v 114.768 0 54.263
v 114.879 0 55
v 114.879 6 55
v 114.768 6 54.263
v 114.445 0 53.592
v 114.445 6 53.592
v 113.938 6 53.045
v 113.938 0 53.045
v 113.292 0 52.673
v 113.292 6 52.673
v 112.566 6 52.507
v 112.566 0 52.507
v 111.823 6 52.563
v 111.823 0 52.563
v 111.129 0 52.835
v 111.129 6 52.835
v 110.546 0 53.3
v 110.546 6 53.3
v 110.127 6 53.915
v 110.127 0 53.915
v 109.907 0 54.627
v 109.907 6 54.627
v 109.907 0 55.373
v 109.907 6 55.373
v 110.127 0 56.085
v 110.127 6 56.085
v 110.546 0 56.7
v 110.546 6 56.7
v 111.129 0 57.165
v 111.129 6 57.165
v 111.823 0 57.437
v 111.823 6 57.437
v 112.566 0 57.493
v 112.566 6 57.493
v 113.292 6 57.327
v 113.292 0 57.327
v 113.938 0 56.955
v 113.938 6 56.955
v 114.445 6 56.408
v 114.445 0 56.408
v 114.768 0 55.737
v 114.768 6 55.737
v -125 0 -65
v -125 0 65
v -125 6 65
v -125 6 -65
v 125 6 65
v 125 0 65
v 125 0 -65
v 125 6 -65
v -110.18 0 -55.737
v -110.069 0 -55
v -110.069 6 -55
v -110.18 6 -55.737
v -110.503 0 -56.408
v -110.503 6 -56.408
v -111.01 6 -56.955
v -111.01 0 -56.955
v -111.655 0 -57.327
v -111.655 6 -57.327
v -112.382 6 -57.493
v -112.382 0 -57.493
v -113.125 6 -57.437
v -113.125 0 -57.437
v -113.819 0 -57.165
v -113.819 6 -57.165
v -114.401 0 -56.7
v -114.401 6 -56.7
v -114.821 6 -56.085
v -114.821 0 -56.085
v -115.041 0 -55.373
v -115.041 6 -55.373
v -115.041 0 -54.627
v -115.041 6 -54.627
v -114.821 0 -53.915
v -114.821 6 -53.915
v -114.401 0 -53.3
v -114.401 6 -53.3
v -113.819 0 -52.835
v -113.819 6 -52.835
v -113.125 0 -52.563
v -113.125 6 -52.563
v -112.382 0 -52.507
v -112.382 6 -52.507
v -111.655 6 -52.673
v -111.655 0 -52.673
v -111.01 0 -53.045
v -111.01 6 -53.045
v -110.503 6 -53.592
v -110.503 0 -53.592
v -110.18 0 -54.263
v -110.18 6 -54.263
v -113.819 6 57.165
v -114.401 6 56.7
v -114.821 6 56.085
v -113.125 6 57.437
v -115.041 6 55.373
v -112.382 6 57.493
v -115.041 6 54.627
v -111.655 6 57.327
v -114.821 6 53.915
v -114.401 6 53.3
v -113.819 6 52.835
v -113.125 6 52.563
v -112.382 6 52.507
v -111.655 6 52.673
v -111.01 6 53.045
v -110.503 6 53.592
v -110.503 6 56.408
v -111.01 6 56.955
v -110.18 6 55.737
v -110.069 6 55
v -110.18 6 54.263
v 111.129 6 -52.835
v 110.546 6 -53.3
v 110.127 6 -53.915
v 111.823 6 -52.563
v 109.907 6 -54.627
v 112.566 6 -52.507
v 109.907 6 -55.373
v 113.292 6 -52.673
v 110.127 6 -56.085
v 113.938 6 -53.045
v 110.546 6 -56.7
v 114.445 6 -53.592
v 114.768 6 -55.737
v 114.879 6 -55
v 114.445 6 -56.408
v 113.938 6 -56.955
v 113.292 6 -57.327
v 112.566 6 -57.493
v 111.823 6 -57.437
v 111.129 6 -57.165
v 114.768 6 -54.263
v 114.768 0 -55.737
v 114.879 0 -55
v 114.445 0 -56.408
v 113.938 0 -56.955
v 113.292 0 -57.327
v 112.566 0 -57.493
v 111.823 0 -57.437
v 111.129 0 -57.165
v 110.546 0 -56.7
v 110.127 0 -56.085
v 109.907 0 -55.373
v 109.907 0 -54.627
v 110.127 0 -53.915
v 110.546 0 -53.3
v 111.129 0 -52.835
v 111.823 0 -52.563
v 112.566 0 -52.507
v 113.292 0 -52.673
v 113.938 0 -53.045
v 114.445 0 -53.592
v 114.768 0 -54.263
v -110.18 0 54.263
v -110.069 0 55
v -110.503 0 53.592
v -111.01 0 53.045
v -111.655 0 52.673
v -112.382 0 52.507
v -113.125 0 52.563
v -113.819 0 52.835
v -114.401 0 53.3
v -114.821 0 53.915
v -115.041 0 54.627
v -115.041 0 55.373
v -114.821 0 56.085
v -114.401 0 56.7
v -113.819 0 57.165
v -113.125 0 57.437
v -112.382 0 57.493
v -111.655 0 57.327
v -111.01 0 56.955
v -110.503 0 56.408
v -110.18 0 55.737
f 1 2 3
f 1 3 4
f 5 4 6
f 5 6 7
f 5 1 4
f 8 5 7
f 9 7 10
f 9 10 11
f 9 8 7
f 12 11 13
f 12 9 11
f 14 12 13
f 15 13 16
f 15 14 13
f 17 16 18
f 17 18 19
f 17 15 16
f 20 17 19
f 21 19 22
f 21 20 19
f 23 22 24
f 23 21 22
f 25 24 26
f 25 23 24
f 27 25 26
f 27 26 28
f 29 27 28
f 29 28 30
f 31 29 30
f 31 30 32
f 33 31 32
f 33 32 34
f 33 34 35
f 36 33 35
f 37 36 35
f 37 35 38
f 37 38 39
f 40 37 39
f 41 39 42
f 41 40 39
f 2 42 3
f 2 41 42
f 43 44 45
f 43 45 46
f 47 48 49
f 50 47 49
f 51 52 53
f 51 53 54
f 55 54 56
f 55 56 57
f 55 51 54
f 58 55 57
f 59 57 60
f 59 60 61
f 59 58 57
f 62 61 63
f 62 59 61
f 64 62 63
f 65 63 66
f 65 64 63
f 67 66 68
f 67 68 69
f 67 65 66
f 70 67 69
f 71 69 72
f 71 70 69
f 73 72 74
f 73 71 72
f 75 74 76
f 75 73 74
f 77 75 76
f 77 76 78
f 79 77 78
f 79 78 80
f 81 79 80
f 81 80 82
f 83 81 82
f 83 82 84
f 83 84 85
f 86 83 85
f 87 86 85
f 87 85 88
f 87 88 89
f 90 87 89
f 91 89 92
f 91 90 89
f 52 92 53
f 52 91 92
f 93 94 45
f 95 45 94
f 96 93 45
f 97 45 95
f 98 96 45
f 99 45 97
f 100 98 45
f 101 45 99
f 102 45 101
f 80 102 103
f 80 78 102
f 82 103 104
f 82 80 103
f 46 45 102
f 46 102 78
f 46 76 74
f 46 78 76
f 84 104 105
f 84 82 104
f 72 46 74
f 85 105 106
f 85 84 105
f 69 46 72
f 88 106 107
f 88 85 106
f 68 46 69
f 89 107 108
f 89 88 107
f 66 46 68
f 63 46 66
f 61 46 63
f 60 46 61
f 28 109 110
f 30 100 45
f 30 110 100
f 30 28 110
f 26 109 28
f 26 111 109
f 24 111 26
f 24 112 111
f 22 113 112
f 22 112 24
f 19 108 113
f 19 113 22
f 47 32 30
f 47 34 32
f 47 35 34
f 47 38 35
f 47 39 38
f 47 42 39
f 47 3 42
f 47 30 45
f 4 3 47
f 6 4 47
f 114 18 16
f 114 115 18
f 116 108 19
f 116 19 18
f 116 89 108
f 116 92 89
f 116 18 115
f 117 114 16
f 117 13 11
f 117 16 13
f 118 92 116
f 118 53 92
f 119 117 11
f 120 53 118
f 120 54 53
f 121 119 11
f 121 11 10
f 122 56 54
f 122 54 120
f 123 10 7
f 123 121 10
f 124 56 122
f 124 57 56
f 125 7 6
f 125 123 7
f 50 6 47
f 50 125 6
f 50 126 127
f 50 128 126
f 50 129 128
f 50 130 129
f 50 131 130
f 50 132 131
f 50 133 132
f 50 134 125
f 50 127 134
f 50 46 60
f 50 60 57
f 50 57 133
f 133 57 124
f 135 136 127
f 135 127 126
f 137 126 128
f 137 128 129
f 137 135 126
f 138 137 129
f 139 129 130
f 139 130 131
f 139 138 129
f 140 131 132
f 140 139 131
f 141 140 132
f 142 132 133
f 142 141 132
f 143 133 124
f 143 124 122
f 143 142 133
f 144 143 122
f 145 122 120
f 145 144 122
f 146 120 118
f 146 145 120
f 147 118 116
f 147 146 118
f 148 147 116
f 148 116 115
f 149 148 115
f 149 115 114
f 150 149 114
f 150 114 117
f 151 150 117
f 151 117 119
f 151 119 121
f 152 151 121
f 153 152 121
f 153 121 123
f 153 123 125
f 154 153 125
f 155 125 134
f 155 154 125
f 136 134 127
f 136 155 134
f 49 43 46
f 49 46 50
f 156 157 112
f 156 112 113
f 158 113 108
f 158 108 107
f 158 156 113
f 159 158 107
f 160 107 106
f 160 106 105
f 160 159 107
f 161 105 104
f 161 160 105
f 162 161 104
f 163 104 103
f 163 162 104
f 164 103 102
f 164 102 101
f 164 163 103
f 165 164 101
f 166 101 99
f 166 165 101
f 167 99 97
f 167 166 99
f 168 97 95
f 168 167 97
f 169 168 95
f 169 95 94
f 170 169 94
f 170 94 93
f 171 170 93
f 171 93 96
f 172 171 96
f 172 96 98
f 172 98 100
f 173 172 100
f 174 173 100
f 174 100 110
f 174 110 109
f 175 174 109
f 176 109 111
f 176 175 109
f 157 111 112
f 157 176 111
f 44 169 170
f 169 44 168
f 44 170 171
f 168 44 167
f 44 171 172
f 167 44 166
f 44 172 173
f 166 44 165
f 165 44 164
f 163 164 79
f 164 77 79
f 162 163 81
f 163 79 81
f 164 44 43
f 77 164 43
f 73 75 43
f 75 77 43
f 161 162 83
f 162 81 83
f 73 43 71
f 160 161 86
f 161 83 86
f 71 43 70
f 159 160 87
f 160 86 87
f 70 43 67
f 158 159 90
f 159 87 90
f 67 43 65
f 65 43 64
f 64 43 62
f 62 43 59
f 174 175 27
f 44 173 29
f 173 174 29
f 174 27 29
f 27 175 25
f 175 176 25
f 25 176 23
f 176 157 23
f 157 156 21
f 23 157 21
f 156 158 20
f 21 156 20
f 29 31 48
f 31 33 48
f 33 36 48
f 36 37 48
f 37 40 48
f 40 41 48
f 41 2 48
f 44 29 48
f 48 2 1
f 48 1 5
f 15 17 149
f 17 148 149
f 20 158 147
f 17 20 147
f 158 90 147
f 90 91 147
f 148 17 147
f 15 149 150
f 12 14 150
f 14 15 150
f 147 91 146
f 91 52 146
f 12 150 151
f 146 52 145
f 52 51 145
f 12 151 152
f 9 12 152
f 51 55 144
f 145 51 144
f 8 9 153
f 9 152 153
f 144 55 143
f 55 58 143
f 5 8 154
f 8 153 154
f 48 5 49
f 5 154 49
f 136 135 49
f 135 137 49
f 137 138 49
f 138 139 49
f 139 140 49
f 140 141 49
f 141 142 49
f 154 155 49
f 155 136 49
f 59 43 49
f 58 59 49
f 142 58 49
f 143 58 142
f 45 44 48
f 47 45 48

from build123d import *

# Parameters (mm, degrees)
SKETCH1_W           = 250
SKETCH1_H           = 130
BOSS_EXTRUDE1_DEPTH = 6
SKETCH1_4_R         = 2.5
CUT_EXTRUDE1_DEPTH  = 6


with BuildPart() as part:
    # Sketch1 → Boss-Extrude1 (new body)
    with BuildSketch(Plane(origin=(0, 0, 0), x_dir=(1, 0, 0), z_dir=(0, 1, 0))):
        Rectangle(SKETCH1_W, SKETCH1_H)
    extrude(amount=BOSS_EXTRUDE1_DEPTH)

    # Sketch1<4> → Cut-Extrude1 (cut)
    with BuildSketch(Plane(origin=(0, 0, 0), x_dir=(1, 0, 0), z_dir=(0, 1, 0))):
        with Locations((-112.568736162, 55)):
            Circle(SKETCH1_4_R)
        with Locations((112.379080965, 55)):
            Circle(SKETCH1_4_R)
        with Locations((112.379080965, -55)):
            Circle(SKETCH1_4_R)
        with Locations((-112.568736162, -55)):
            Circle(SKETCH1_4_R)
    extrude(amount=CUT_EXTRUDE1_DEPTH, mode=Mode.SUBTRACT)


solid = part.part
